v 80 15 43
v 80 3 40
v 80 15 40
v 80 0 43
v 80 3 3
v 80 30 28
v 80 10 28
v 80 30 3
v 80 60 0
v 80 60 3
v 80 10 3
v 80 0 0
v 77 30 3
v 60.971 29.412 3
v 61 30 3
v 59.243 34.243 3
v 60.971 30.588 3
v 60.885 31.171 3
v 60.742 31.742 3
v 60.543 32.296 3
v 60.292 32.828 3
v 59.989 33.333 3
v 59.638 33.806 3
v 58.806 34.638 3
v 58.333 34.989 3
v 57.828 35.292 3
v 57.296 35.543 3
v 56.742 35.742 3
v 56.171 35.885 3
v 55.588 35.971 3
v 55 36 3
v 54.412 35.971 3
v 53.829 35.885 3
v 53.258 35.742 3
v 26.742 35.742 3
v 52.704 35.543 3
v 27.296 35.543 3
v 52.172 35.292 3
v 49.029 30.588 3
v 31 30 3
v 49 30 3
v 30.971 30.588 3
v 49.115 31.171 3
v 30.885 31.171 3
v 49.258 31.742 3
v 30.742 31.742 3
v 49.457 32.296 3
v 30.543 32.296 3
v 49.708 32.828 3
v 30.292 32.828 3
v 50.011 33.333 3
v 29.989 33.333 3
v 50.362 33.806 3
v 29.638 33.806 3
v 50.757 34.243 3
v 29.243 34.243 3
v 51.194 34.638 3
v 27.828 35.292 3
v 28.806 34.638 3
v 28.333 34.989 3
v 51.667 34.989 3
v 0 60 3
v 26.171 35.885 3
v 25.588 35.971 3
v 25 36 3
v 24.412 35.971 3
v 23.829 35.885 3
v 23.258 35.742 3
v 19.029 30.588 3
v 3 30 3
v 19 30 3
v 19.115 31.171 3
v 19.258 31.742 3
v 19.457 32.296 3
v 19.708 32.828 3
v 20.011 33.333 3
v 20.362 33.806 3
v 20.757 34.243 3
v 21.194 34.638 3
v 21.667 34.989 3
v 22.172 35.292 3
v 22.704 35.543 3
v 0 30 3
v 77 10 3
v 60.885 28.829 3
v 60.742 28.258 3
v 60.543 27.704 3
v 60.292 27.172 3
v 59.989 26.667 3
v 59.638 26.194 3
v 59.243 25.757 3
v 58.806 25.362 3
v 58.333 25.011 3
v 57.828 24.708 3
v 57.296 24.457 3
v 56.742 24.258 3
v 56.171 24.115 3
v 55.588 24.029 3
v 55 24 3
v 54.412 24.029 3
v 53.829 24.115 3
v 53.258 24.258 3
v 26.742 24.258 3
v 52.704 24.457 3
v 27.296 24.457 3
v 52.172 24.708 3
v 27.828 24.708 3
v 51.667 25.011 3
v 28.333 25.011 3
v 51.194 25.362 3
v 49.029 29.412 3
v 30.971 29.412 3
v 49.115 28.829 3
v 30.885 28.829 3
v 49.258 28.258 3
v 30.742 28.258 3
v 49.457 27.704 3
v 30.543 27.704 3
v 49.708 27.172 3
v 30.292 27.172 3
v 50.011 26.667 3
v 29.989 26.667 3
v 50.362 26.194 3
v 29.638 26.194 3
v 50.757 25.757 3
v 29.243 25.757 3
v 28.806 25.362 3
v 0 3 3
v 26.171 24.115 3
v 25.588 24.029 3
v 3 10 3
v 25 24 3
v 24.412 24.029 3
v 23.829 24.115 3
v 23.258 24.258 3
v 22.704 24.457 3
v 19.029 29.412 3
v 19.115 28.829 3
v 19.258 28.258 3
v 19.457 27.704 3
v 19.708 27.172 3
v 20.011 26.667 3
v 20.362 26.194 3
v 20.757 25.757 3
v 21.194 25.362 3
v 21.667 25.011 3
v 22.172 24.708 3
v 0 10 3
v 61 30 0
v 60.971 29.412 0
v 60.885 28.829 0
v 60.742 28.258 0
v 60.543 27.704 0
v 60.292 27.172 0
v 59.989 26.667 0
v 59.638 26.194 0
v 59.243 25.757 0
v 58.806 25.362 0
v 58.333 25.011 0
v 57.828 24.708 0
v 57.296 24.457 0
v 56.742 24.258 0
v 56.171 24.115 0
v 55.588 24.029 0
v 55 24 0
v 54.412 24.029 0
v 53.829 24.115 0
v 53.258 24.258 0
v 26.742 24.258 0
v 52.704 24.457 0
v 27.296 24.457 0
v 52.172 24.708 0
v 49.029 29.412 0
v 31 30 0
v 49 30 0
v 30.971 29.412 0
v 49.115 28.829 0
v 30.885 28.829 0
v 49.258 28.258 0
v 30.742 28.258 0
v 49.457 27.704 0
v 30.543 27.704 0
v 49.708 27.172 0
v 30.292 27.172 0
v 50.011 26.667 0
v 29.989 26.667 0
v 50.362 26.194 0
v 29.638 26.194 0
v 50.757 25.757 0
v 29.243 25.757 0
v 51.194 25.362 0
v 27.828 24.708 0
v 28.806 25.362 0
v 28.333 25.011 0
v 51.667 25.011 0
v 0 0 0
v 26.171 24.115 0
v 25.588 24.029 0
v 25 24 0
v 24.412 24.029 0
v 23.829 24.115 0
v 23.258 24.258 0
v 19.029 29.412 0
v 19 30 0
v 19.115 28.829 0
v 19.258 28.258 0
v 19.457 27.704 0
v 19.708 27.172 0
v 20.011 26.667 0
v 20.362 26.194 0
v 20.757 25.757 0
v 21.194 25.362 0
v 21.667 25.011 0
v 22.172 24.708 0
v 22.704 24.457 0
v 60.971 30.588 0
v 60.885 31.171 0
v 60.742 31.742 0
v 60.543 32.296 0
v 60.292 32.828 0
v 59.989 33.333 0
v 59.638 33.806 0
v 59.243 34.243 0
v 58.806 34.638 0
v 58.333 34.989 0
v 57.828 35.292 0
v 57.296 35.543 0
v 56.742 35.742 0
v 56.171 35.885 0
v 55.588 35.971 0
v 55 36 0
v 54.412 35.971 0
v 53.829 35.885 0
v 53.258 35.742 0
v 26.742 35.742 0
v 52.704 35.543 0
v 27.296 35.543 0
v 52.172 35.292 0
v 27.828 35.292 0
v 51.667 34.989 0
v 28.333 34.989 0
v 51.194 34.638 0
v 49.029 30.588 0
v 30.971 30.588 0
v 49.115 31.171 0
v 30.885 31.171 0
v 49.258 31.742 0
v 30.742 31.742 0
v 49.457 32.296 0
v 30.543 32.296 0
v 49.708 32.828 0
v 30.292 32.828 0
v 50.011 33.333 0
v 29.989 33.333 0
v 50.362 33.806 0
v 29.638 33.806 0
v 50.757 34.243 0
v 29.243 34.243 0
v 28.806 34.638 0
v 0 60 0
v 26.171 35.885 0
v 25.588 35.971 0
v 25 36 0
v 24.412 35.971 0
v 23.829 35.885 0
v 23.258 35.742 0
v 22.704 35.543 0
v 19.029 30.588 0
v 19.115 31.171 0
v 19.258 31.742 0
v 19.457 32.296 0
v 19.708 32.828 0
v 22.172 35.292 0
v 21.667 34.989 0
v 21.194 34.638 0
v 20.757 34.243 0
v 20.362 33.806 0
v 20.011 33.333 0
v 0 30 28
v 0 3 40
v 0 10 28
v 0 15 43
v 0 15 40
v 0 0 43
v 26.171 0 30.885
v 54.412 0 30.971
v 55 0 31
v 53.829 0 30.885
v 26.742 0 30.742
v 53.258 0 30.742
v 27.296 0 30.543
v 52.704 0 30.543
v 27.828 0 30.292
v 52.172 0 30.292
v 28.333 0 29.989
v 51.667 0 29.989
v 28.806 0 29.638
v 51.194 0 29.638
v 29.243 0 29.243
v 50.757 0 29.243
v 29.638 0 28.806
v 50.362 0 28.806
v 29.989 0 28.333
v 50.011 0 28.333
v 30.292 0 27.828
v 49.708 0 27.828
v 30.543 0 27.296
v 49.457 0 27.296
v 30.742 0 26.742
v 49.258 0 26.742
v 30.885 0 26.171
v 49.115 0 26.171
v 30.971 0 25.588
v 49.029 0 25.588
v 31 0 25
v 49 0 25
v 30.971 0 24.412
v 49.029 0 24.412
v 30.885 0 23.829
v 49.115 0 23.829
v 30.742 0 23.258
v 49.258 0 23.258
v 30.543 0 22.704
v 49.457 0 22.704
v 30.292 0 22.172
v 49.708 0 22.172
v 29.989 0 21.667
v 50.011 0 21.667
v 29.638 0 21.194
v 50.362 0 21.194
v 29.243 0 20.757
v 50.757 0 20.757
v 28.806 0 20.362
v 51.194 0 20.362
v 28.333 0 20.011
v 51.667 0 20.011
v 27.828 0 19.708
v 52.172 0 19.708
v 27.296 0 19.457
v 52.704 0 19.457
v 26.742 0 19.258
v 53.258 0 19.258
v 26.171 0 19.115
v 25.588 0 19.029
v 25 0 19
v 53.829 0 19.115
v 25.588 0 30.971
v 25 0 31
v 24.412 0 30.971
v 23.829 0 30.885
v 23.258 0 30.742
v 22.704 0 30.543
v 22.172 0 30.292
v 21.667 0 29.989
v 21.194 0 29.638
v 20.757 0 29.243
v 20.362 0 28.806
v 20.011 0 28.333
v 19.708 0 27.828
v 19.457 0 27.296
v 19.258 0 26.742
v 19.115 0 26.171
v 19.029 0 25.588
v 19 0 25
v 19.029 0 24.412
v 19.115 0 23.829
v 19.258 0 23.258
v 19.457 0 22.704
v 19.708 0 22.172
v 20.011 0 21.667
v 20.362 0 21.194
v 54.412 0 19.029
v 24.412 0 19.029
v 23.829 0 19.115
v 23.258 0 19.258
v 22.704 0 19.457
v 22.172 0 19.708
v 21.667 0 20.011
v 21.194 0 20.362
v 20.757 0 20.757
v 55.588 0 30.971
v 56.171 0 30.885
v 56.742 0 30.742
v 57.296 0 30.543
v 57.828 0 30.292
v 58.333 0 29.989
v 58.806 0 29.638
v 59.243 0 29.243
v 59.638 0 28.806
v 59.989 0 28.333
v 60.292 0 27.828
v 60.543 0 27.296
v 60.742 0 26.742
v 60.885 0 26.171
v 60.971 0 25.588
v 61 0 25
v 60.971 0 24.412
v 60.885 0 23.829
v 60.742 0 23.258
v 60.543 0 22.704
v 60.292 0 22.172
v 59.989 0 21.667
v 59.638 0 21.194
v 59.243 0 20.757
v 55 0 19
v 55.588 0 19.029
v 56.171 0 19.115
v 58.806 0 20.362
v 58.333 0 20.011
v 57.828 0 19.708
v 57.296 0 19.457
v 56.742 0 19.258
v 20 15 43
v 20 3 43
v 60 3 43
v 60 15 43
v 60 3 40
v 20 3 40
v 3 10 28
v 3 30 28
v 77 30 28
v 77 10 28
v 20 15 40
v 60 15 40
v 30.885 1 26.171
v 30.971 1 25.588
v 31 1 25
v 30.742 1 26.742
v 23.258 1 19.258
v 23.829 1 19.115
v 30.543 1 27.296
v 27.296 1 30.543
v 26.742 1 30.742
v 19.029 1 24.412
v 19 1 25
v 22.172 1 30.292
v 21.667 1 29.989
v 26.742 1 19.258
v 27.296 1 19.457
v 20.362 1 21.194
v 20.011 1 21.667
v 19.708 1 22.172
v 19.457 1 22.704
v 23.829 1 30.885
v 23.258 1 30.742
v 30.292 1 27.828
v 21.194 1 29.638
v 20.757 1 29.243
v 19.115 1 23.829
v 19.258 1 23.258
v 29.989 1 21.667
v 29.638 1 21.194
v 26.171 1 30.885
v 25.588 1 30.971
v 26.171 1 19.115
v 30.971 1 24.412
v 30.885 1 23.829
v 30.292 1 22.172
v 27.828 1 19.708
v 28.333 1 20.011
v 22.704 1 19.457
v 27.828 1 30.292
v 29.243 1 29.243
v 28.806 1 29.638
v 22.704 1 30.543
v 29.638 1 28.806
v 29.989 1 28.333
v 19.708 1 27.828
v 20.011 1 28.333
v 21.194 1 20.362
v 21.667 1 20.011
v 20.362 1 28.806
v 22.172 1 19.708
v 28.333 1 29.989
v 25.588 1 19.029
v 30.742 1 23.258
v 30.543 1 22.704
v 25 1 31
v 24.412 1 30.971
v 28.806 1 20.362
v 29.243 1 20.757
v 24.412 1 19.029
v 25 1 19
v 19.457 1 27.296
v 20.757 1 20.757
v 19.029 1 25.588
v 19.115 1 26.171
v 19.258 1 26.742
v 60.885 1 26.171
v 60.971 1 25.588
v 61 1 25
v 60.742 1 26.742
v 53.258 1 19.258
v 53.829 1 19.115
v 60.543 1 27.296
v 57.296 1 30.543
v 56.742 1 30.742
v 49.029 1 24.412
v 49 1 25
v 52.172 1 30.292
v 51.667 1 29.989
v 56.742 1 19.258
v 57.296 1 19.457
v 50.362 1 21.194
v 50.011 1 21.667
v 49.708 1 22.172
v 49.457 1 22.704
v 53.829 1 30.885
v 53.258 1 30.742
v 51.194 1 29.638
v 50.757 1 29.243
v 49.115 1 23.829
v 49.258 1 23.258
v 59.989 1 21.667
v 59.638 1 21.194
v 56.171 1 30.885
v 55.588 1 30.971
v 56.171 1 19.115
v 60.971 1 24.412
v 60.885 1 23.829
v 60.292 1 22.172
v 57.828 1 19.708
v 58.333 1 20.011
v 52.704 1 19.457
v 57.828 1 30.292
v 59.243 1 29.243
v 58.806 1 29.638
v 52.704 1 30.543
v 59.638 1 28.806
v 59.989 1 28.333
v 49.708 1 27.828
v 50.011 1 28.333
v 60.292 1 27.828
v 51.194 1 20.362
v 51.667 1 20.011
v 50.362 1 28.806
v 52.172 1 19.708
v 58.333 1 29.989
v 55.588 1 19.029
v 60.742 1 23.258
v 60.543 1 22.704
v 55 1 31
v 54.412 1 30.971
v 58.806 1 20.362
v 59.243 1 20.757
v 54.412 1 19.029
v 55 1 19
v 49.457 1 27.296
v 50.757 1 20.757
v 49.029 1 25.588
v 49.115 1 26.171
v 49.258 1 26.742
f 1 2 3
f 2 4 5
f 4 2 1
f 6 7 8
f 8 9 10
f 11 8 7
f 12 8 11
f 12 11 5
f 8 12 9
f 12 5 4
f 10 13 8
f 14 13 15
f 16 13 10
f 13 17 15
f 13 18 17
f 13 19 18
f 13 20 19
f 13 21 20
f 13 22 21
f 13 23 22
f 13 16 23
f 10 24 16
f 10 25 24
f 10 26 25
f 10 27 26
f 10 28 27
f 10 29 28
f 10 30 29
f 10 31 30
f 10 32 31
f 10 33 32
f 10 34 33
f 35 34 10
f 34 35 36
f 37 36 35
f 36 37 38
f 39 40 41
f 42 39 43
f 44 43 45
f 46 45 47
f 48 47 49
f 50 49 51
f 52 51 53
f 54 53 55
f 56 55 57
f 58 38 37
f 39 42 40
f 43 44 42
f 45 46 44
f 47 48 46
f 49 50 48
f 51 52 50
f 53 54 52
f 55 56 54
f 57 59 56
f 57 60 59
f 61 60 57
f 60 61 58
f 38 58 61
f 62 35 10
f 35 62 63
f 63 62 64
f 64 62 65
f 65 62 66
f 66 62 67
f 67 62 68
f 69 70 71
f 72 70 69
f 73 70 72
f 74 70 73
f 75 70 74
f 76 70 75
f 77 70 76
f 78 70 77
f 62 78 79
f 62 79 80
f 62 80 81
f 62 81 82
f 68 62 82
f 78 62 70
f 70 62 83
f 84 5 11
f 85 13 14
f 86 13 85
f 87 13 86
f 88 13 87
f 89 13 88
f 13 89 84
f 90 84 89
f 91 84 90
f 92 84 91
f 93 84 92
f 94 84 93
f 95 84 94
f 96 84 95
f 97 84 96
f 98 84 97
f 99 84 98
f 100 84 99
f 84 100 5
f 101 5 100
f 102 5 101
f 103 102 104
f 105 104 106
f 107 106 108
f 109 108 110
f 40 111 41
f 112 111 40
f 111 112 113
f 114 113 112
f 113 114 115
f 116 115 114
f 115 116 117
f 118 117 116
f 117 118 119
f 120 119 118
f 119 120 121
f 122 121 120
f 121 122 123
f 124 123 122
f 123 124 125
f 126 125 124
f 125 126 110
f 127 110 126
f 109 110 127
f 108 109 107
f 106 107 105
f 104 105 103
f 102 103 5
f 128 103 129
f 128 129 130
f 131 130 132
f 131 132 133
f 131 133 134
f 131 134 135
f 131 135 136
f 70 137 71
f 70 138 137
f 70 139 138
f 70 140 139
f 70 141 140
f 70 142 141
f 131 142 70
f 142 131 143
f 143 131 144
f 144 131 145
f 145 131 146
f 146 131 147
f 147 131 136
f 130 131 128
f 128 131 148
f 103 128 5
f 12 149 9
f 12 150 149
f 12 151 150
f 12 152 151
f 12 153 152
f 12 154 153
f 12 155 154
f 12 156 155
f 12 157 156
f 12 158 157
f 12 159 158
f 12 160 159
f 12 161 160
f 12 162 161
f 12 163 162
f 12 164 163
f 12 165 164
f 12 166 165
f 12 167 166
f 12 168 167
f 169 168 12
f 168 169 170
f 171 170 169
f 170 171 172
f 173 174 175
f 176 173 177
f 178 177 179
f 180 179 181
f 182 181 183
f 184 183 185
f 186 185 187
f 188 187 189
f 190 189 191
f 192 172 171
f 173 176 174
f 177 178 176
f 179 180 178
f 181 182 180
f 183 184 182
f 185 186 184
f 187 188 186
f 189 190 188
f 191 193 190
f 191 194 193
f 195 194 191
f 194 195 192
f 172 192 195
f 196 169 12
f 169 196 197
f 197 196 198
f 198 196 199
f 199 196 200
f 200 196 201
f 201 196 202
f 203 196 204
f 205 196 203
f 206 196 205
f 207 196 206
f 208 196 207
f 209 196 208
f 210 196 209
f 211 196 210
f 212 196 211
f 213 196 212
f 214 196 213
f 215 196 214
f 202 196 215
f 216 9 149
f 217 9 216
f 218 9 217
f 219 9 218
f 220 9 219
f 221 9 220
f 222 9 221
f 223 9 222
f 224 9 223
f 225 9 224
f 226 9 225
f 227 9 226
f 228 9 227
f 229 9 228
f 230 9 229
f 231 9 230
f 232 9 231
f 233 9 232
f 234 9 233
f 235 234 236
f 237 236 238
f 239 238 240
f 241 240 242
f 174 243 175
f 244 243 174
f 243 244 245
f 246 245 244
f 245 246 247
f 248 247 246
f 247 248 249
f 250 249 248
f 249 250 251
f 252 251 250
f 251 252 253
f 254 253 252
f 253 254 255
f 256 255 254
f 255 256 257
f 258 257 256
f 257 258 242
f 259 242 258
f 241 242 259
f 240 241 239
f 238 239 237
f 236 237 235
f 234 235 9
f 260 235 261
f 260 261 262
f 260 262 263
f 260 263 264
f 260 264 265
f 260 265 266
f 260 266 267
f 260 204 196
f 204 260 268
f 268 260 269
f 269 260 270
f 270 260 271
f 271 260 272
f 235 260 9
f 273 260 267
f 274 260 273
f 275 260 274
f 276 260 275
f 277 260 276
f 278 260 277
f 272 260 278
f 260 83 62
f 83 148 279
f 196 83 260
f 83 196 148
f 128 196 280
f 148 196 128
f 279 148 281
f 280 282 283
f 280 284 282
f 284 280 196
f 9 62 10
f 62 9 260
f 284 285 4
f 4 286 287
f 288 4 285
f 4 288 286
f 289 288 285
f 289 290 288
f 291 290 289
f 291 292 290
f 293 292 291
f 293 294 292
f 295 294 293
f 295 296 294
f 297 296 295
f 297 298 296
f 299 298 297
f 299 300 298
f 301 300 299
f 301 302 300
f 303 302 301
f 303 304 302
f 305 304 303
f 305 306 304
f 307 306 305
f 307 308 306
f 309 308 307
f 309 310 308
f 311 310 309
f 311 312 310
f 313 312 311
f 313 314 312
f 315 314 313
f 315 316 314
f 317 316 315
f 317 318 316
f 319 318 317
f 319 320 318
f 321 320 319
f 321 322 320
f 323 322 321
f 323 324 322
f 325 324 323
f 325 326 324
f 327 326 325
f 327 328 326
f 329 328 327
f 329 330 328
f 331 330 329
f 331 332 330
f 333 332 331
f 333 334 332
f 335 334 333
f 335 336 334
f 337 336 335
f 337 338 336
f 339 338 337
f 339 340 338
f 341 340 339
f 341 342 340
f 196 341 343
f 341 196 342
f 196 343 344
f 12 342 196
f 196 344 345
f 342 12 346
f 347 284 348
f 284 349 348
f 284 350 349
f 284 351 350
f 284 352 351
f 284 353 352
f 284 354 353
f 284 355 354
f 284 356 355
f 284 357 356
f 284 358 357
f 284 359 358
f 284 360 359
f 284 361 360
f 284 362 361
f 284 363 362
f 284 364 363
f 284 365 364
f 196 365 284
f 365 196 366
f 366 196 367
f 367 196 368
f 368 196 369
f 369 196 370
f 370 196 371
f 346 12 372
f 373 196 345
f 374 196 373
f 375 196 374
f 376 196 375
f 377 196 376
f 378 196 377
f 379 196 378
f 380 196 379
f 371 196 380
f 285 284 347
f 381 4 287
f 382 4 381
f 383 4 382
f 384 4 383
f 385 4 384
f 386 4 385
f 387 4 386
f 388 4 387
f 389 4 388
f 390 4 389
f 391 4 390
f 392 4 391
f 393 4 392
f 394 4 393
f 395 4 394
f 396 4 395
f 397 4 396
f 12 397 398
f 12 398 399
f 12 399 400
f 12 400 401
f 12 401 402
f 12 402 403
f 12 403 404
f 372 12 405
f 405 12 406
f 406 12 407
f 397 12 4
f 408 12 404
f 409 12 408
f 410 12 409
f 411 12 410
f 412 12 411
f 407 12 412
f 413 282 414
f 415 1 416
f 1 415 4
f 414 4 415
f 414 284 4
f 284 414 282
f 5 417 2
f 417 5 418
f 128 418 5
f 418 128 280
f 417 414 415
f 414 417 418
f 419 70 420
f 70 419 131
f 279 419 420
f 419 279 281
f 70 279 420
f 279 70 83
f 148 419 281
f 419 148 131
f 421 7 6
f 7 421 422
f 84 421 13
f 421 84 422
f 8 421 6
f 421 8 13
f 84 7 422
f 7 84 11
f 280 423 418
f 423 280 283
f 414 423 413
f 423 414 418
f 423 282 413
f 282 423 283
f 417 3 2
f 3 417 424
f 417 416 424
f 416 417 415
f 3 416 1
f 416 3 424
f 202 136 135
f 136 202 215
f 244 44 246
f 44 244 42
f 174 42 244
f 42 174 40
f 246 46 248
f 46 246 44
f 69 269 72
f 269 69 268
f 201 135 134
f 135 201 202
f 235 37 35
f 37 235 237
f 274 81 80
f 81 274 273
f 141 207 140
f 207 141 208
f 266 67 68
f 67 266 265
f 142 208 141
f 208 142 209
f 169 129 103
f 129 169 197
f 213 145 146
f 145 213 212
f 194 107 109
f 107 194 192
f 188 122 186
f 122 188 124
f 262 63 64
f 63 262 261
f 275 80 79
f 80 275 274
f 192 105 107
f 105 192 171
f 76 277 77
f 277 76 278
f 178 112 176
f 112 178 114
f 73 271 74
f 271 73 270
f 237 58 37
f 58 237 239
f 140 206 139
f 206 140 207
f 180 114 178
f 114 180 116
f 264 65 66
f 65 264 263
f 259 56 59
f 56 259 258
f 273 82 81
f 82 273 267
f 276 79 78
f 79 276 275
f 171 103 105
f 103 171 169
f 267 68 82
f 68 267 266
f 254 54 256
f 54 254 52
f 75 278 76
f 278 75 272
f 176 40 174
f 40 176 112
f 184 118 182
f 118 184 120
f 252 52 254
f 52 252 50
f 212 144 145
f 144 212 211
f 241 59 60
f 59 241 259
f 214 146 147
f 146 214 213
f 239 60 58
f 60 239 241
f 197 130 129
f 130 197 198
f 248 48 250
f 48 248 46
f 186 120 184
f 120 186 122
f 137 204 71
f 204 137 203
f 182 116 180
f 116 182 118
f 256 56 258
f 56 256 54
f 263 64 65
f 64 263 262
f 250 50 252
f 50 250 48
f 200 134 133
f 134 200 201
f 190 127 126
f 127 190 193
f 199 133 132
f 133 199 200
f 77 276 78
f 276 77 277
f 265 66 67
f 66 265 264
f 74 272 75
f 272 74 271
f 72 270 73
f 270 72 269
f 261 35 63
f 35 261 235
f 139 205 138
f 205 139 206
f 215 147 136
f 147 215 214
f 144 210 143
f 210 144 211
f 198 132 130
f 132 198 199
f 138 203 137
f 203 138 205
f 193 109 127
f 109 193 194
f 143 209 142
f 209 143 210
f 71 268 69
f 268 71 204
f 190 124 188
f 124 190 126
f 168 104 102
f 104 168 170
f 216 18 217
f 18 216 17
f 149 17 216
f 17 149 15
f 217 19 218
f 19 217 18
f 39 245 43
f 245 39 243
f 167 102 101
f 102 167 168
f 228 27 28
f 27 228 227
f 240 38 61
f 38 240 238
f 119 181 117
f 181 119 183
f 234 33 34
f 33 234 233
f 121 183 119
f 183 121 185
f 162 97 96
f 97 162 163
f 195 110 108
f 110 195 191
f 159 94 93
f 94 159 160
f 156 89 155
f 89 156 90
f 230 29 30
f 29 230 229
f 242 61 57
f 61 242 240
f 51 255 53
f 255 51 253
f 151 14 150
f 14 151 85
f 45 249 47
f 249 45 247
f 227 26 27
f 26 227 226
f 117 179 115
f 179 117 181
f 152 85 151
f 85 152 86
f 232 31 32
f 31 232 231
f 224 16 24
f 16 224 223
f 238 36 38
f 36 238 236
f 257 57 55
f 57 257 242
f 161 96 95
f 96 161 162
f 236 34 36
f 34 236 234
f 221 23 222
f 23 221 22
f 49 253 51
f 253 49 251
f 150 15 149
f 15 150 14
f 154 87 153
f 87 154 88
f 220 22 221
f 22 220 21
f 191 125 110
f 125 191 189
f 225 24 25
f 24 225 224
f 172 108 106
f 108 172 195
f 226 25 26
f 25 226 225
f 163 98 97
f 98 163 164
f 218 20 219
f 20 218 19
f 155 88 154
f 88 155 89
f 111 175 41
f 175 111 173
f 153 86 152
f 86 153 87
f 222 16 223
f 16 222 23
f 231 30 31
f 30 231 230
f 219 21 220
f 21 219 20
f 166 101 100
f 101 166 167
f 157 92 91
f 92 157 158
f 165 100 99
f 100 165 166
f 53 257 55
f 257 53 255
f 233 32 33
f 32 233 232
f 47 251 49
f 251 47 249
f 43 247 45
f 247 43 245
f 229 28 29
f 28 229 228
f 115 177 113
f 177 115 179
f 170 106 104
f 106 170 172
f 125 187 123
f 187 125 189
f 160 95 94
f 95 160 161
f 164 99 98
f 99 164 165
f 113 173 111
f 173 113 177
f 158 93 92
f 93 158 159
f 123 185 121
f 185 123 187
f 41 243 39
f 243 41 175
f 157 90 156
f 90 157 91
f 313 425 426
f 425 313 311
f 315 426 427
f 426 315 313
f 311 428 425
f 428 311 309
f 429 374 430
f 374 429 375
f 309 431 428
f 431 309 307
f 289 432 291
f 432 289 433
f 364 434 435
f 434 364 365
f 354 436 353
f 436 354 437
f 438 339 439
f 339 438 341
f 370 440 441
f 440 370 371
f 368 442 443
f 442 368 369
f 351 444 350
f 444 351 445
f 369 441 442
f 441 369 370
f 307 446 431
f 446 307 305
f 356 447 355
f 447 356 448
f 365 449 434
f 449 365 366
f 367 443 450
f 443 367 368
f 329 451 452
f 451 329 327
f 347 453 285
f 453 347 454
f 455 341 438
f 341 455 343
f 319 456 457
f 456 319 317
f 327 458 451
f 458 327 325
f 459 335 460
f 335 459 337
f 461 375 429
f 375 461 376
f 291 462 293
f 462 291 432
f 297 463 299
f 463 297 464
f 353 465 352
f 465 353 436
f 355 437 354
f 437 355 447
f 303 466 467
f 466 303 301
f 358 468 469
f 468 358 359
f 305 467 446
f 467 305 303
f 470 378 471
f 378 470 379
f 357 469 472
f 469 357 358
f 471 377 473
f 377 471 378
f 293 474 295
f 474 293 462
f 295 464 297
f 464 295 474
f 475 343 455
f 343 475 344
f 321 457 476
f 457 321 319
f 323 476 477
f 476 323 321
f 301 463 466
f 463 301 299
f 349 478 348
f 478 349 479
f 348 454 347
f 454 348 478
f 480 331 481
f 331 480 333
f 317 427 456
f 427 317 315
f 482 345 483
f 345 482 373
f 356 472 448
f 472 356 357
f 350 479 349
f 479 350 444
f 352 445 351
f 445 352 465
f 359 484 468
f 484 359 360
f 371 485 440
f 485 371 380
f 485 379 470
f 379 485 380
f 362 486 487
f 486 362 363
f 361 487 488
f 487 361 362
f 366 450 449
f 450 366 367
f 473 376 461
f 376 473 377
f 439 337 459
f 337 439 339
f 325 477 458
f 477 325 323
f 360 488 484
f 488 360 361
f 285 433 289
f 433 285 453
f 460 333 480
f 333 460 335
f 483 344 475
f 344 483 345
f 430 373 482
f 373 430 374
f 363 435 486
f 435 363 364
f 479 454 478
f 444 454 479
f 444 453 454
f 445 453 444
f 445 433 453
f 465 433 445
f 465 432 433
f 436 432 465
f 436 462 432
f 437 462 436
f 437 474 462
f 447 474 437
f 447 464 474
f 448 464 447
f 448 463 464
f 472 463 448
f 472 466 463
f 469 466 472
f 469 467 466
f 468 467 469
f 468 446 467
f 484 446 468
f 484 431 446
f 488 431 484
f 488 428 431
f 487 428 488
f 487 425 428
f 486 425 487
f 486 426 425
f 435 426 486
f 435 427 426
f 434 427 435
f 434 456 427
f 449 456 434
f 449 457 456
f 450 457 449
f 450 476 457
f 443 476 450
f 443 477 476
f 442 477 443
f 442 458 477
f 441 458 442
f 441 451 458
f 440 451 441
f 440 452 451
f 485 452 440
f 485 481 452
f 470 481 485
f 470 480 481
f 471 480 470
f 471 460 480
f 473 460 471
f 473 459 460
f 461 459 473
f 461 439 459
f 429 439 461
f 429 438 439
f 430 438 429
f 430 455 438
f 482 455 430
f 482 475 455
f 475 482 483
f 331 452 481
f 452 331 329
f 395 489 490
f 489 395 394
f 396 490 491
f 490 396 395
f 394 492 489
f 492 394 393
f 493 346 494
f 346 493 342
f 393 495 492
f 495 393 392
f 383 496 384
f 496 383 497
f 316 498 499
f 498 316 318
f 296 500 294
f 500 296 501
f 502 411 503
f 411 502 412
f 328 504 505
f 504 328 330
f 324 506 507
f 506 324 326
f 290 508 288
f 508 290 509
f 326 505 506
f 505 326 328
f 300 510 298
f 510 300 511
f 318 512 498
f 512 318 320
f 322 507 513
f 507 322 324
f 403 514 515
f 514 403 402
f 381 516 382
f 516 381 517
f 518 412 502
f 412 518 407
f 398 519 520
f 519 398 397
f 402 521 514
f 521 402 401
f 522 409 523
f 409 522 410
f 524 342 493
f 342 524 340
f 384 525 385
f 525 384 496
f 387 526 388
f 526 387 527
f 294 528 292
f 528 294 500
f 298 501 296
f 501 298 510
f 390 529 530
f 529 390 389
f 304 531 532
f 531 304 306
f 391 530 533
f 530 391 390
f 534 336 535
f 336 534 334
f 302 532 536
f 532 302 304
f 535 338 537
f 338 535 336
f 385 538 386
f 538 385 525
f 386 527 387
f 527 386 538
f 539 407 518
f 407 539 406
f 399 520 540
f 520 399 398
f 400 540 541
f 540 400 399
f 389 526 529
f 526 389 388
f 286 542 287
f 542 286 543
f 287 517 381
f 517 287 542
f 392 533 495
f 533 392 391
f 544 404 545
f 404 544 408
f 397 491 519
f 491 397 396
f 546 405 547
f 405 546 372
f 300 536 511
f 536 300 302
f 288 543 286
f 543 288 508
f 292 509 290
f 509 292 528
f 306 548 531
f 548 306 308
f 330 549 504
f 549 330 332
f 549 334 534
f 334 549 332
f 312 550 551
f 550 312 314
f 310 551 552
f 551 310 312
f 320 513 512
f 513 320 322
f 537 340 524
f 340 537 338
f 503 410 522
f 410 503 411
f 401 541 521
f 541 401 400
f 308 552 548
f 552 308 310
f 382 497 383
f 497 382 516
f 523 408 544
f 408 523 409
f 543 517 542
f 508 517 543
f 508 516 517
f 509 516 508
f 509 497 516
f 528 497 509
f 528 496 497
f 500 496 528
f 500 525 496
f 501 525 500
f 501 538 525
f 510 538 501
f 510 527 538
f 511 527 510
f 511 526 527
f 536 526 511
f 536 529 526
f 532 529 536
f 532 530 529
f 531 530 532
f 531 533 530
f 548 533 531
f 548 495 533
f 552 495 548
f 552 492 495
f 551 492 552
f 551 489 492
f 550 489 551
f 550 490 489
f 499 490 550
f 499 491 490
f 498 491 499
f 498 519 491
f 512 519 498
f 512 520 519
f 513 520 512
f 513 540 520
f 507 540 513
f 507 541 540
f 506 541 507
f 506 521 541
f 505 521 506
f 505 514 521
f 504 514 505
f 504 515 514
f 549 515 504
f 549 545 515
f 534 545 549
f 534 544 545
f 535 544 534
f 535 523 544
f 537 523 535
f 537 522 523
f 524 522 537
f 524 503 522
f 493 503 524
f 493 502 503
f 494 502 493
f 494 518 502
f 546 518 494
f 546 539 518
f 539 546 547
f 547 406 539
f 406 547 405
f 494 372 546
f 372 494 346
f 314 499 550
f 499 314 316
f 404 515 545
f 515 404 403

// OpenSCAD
// Approximate bracket model reconstructed from photos.
// Dimensions are ESTIMATES and must be measured from the real part.

th = 3;          // material thickness
base_w = 80;
base_d = 60;
wall_h = 40;

difference() {
    union() {
        // base
        cube([base_w, base_d, th]);

        // back wall
        translate([0,0,th])
            cube([base_w, th, wall_h]);

        // side tabs
        translate([0,10,th])
            cube([th,20,25]);

        translate([base_w-th,10,th])
            cube([th,20,25]);

        // top ears
        translate([0,0,wall_h+th])
            rotate([0,90,0]) cube([th,15,20]);

        translate([base_w-20,0,wall_h+th])
            rotate([0,90,0]) cube([th,15,20]);
    }

    // large holes (approximate)
    translate([25,30,-1]) cylinder(h=10,d=12,$fn=64);
    translate([55,30,-1]) cylinder(h=10,d=12,$fn=64);

    translate([25,1,25]) rotate([90,0,0])
        cylinder(h=10,d=12,$fn=64);
    translate([55,1,25]) rotate([90,0,0])
        cylinder(h=10,d=12,$fn=64);
}
